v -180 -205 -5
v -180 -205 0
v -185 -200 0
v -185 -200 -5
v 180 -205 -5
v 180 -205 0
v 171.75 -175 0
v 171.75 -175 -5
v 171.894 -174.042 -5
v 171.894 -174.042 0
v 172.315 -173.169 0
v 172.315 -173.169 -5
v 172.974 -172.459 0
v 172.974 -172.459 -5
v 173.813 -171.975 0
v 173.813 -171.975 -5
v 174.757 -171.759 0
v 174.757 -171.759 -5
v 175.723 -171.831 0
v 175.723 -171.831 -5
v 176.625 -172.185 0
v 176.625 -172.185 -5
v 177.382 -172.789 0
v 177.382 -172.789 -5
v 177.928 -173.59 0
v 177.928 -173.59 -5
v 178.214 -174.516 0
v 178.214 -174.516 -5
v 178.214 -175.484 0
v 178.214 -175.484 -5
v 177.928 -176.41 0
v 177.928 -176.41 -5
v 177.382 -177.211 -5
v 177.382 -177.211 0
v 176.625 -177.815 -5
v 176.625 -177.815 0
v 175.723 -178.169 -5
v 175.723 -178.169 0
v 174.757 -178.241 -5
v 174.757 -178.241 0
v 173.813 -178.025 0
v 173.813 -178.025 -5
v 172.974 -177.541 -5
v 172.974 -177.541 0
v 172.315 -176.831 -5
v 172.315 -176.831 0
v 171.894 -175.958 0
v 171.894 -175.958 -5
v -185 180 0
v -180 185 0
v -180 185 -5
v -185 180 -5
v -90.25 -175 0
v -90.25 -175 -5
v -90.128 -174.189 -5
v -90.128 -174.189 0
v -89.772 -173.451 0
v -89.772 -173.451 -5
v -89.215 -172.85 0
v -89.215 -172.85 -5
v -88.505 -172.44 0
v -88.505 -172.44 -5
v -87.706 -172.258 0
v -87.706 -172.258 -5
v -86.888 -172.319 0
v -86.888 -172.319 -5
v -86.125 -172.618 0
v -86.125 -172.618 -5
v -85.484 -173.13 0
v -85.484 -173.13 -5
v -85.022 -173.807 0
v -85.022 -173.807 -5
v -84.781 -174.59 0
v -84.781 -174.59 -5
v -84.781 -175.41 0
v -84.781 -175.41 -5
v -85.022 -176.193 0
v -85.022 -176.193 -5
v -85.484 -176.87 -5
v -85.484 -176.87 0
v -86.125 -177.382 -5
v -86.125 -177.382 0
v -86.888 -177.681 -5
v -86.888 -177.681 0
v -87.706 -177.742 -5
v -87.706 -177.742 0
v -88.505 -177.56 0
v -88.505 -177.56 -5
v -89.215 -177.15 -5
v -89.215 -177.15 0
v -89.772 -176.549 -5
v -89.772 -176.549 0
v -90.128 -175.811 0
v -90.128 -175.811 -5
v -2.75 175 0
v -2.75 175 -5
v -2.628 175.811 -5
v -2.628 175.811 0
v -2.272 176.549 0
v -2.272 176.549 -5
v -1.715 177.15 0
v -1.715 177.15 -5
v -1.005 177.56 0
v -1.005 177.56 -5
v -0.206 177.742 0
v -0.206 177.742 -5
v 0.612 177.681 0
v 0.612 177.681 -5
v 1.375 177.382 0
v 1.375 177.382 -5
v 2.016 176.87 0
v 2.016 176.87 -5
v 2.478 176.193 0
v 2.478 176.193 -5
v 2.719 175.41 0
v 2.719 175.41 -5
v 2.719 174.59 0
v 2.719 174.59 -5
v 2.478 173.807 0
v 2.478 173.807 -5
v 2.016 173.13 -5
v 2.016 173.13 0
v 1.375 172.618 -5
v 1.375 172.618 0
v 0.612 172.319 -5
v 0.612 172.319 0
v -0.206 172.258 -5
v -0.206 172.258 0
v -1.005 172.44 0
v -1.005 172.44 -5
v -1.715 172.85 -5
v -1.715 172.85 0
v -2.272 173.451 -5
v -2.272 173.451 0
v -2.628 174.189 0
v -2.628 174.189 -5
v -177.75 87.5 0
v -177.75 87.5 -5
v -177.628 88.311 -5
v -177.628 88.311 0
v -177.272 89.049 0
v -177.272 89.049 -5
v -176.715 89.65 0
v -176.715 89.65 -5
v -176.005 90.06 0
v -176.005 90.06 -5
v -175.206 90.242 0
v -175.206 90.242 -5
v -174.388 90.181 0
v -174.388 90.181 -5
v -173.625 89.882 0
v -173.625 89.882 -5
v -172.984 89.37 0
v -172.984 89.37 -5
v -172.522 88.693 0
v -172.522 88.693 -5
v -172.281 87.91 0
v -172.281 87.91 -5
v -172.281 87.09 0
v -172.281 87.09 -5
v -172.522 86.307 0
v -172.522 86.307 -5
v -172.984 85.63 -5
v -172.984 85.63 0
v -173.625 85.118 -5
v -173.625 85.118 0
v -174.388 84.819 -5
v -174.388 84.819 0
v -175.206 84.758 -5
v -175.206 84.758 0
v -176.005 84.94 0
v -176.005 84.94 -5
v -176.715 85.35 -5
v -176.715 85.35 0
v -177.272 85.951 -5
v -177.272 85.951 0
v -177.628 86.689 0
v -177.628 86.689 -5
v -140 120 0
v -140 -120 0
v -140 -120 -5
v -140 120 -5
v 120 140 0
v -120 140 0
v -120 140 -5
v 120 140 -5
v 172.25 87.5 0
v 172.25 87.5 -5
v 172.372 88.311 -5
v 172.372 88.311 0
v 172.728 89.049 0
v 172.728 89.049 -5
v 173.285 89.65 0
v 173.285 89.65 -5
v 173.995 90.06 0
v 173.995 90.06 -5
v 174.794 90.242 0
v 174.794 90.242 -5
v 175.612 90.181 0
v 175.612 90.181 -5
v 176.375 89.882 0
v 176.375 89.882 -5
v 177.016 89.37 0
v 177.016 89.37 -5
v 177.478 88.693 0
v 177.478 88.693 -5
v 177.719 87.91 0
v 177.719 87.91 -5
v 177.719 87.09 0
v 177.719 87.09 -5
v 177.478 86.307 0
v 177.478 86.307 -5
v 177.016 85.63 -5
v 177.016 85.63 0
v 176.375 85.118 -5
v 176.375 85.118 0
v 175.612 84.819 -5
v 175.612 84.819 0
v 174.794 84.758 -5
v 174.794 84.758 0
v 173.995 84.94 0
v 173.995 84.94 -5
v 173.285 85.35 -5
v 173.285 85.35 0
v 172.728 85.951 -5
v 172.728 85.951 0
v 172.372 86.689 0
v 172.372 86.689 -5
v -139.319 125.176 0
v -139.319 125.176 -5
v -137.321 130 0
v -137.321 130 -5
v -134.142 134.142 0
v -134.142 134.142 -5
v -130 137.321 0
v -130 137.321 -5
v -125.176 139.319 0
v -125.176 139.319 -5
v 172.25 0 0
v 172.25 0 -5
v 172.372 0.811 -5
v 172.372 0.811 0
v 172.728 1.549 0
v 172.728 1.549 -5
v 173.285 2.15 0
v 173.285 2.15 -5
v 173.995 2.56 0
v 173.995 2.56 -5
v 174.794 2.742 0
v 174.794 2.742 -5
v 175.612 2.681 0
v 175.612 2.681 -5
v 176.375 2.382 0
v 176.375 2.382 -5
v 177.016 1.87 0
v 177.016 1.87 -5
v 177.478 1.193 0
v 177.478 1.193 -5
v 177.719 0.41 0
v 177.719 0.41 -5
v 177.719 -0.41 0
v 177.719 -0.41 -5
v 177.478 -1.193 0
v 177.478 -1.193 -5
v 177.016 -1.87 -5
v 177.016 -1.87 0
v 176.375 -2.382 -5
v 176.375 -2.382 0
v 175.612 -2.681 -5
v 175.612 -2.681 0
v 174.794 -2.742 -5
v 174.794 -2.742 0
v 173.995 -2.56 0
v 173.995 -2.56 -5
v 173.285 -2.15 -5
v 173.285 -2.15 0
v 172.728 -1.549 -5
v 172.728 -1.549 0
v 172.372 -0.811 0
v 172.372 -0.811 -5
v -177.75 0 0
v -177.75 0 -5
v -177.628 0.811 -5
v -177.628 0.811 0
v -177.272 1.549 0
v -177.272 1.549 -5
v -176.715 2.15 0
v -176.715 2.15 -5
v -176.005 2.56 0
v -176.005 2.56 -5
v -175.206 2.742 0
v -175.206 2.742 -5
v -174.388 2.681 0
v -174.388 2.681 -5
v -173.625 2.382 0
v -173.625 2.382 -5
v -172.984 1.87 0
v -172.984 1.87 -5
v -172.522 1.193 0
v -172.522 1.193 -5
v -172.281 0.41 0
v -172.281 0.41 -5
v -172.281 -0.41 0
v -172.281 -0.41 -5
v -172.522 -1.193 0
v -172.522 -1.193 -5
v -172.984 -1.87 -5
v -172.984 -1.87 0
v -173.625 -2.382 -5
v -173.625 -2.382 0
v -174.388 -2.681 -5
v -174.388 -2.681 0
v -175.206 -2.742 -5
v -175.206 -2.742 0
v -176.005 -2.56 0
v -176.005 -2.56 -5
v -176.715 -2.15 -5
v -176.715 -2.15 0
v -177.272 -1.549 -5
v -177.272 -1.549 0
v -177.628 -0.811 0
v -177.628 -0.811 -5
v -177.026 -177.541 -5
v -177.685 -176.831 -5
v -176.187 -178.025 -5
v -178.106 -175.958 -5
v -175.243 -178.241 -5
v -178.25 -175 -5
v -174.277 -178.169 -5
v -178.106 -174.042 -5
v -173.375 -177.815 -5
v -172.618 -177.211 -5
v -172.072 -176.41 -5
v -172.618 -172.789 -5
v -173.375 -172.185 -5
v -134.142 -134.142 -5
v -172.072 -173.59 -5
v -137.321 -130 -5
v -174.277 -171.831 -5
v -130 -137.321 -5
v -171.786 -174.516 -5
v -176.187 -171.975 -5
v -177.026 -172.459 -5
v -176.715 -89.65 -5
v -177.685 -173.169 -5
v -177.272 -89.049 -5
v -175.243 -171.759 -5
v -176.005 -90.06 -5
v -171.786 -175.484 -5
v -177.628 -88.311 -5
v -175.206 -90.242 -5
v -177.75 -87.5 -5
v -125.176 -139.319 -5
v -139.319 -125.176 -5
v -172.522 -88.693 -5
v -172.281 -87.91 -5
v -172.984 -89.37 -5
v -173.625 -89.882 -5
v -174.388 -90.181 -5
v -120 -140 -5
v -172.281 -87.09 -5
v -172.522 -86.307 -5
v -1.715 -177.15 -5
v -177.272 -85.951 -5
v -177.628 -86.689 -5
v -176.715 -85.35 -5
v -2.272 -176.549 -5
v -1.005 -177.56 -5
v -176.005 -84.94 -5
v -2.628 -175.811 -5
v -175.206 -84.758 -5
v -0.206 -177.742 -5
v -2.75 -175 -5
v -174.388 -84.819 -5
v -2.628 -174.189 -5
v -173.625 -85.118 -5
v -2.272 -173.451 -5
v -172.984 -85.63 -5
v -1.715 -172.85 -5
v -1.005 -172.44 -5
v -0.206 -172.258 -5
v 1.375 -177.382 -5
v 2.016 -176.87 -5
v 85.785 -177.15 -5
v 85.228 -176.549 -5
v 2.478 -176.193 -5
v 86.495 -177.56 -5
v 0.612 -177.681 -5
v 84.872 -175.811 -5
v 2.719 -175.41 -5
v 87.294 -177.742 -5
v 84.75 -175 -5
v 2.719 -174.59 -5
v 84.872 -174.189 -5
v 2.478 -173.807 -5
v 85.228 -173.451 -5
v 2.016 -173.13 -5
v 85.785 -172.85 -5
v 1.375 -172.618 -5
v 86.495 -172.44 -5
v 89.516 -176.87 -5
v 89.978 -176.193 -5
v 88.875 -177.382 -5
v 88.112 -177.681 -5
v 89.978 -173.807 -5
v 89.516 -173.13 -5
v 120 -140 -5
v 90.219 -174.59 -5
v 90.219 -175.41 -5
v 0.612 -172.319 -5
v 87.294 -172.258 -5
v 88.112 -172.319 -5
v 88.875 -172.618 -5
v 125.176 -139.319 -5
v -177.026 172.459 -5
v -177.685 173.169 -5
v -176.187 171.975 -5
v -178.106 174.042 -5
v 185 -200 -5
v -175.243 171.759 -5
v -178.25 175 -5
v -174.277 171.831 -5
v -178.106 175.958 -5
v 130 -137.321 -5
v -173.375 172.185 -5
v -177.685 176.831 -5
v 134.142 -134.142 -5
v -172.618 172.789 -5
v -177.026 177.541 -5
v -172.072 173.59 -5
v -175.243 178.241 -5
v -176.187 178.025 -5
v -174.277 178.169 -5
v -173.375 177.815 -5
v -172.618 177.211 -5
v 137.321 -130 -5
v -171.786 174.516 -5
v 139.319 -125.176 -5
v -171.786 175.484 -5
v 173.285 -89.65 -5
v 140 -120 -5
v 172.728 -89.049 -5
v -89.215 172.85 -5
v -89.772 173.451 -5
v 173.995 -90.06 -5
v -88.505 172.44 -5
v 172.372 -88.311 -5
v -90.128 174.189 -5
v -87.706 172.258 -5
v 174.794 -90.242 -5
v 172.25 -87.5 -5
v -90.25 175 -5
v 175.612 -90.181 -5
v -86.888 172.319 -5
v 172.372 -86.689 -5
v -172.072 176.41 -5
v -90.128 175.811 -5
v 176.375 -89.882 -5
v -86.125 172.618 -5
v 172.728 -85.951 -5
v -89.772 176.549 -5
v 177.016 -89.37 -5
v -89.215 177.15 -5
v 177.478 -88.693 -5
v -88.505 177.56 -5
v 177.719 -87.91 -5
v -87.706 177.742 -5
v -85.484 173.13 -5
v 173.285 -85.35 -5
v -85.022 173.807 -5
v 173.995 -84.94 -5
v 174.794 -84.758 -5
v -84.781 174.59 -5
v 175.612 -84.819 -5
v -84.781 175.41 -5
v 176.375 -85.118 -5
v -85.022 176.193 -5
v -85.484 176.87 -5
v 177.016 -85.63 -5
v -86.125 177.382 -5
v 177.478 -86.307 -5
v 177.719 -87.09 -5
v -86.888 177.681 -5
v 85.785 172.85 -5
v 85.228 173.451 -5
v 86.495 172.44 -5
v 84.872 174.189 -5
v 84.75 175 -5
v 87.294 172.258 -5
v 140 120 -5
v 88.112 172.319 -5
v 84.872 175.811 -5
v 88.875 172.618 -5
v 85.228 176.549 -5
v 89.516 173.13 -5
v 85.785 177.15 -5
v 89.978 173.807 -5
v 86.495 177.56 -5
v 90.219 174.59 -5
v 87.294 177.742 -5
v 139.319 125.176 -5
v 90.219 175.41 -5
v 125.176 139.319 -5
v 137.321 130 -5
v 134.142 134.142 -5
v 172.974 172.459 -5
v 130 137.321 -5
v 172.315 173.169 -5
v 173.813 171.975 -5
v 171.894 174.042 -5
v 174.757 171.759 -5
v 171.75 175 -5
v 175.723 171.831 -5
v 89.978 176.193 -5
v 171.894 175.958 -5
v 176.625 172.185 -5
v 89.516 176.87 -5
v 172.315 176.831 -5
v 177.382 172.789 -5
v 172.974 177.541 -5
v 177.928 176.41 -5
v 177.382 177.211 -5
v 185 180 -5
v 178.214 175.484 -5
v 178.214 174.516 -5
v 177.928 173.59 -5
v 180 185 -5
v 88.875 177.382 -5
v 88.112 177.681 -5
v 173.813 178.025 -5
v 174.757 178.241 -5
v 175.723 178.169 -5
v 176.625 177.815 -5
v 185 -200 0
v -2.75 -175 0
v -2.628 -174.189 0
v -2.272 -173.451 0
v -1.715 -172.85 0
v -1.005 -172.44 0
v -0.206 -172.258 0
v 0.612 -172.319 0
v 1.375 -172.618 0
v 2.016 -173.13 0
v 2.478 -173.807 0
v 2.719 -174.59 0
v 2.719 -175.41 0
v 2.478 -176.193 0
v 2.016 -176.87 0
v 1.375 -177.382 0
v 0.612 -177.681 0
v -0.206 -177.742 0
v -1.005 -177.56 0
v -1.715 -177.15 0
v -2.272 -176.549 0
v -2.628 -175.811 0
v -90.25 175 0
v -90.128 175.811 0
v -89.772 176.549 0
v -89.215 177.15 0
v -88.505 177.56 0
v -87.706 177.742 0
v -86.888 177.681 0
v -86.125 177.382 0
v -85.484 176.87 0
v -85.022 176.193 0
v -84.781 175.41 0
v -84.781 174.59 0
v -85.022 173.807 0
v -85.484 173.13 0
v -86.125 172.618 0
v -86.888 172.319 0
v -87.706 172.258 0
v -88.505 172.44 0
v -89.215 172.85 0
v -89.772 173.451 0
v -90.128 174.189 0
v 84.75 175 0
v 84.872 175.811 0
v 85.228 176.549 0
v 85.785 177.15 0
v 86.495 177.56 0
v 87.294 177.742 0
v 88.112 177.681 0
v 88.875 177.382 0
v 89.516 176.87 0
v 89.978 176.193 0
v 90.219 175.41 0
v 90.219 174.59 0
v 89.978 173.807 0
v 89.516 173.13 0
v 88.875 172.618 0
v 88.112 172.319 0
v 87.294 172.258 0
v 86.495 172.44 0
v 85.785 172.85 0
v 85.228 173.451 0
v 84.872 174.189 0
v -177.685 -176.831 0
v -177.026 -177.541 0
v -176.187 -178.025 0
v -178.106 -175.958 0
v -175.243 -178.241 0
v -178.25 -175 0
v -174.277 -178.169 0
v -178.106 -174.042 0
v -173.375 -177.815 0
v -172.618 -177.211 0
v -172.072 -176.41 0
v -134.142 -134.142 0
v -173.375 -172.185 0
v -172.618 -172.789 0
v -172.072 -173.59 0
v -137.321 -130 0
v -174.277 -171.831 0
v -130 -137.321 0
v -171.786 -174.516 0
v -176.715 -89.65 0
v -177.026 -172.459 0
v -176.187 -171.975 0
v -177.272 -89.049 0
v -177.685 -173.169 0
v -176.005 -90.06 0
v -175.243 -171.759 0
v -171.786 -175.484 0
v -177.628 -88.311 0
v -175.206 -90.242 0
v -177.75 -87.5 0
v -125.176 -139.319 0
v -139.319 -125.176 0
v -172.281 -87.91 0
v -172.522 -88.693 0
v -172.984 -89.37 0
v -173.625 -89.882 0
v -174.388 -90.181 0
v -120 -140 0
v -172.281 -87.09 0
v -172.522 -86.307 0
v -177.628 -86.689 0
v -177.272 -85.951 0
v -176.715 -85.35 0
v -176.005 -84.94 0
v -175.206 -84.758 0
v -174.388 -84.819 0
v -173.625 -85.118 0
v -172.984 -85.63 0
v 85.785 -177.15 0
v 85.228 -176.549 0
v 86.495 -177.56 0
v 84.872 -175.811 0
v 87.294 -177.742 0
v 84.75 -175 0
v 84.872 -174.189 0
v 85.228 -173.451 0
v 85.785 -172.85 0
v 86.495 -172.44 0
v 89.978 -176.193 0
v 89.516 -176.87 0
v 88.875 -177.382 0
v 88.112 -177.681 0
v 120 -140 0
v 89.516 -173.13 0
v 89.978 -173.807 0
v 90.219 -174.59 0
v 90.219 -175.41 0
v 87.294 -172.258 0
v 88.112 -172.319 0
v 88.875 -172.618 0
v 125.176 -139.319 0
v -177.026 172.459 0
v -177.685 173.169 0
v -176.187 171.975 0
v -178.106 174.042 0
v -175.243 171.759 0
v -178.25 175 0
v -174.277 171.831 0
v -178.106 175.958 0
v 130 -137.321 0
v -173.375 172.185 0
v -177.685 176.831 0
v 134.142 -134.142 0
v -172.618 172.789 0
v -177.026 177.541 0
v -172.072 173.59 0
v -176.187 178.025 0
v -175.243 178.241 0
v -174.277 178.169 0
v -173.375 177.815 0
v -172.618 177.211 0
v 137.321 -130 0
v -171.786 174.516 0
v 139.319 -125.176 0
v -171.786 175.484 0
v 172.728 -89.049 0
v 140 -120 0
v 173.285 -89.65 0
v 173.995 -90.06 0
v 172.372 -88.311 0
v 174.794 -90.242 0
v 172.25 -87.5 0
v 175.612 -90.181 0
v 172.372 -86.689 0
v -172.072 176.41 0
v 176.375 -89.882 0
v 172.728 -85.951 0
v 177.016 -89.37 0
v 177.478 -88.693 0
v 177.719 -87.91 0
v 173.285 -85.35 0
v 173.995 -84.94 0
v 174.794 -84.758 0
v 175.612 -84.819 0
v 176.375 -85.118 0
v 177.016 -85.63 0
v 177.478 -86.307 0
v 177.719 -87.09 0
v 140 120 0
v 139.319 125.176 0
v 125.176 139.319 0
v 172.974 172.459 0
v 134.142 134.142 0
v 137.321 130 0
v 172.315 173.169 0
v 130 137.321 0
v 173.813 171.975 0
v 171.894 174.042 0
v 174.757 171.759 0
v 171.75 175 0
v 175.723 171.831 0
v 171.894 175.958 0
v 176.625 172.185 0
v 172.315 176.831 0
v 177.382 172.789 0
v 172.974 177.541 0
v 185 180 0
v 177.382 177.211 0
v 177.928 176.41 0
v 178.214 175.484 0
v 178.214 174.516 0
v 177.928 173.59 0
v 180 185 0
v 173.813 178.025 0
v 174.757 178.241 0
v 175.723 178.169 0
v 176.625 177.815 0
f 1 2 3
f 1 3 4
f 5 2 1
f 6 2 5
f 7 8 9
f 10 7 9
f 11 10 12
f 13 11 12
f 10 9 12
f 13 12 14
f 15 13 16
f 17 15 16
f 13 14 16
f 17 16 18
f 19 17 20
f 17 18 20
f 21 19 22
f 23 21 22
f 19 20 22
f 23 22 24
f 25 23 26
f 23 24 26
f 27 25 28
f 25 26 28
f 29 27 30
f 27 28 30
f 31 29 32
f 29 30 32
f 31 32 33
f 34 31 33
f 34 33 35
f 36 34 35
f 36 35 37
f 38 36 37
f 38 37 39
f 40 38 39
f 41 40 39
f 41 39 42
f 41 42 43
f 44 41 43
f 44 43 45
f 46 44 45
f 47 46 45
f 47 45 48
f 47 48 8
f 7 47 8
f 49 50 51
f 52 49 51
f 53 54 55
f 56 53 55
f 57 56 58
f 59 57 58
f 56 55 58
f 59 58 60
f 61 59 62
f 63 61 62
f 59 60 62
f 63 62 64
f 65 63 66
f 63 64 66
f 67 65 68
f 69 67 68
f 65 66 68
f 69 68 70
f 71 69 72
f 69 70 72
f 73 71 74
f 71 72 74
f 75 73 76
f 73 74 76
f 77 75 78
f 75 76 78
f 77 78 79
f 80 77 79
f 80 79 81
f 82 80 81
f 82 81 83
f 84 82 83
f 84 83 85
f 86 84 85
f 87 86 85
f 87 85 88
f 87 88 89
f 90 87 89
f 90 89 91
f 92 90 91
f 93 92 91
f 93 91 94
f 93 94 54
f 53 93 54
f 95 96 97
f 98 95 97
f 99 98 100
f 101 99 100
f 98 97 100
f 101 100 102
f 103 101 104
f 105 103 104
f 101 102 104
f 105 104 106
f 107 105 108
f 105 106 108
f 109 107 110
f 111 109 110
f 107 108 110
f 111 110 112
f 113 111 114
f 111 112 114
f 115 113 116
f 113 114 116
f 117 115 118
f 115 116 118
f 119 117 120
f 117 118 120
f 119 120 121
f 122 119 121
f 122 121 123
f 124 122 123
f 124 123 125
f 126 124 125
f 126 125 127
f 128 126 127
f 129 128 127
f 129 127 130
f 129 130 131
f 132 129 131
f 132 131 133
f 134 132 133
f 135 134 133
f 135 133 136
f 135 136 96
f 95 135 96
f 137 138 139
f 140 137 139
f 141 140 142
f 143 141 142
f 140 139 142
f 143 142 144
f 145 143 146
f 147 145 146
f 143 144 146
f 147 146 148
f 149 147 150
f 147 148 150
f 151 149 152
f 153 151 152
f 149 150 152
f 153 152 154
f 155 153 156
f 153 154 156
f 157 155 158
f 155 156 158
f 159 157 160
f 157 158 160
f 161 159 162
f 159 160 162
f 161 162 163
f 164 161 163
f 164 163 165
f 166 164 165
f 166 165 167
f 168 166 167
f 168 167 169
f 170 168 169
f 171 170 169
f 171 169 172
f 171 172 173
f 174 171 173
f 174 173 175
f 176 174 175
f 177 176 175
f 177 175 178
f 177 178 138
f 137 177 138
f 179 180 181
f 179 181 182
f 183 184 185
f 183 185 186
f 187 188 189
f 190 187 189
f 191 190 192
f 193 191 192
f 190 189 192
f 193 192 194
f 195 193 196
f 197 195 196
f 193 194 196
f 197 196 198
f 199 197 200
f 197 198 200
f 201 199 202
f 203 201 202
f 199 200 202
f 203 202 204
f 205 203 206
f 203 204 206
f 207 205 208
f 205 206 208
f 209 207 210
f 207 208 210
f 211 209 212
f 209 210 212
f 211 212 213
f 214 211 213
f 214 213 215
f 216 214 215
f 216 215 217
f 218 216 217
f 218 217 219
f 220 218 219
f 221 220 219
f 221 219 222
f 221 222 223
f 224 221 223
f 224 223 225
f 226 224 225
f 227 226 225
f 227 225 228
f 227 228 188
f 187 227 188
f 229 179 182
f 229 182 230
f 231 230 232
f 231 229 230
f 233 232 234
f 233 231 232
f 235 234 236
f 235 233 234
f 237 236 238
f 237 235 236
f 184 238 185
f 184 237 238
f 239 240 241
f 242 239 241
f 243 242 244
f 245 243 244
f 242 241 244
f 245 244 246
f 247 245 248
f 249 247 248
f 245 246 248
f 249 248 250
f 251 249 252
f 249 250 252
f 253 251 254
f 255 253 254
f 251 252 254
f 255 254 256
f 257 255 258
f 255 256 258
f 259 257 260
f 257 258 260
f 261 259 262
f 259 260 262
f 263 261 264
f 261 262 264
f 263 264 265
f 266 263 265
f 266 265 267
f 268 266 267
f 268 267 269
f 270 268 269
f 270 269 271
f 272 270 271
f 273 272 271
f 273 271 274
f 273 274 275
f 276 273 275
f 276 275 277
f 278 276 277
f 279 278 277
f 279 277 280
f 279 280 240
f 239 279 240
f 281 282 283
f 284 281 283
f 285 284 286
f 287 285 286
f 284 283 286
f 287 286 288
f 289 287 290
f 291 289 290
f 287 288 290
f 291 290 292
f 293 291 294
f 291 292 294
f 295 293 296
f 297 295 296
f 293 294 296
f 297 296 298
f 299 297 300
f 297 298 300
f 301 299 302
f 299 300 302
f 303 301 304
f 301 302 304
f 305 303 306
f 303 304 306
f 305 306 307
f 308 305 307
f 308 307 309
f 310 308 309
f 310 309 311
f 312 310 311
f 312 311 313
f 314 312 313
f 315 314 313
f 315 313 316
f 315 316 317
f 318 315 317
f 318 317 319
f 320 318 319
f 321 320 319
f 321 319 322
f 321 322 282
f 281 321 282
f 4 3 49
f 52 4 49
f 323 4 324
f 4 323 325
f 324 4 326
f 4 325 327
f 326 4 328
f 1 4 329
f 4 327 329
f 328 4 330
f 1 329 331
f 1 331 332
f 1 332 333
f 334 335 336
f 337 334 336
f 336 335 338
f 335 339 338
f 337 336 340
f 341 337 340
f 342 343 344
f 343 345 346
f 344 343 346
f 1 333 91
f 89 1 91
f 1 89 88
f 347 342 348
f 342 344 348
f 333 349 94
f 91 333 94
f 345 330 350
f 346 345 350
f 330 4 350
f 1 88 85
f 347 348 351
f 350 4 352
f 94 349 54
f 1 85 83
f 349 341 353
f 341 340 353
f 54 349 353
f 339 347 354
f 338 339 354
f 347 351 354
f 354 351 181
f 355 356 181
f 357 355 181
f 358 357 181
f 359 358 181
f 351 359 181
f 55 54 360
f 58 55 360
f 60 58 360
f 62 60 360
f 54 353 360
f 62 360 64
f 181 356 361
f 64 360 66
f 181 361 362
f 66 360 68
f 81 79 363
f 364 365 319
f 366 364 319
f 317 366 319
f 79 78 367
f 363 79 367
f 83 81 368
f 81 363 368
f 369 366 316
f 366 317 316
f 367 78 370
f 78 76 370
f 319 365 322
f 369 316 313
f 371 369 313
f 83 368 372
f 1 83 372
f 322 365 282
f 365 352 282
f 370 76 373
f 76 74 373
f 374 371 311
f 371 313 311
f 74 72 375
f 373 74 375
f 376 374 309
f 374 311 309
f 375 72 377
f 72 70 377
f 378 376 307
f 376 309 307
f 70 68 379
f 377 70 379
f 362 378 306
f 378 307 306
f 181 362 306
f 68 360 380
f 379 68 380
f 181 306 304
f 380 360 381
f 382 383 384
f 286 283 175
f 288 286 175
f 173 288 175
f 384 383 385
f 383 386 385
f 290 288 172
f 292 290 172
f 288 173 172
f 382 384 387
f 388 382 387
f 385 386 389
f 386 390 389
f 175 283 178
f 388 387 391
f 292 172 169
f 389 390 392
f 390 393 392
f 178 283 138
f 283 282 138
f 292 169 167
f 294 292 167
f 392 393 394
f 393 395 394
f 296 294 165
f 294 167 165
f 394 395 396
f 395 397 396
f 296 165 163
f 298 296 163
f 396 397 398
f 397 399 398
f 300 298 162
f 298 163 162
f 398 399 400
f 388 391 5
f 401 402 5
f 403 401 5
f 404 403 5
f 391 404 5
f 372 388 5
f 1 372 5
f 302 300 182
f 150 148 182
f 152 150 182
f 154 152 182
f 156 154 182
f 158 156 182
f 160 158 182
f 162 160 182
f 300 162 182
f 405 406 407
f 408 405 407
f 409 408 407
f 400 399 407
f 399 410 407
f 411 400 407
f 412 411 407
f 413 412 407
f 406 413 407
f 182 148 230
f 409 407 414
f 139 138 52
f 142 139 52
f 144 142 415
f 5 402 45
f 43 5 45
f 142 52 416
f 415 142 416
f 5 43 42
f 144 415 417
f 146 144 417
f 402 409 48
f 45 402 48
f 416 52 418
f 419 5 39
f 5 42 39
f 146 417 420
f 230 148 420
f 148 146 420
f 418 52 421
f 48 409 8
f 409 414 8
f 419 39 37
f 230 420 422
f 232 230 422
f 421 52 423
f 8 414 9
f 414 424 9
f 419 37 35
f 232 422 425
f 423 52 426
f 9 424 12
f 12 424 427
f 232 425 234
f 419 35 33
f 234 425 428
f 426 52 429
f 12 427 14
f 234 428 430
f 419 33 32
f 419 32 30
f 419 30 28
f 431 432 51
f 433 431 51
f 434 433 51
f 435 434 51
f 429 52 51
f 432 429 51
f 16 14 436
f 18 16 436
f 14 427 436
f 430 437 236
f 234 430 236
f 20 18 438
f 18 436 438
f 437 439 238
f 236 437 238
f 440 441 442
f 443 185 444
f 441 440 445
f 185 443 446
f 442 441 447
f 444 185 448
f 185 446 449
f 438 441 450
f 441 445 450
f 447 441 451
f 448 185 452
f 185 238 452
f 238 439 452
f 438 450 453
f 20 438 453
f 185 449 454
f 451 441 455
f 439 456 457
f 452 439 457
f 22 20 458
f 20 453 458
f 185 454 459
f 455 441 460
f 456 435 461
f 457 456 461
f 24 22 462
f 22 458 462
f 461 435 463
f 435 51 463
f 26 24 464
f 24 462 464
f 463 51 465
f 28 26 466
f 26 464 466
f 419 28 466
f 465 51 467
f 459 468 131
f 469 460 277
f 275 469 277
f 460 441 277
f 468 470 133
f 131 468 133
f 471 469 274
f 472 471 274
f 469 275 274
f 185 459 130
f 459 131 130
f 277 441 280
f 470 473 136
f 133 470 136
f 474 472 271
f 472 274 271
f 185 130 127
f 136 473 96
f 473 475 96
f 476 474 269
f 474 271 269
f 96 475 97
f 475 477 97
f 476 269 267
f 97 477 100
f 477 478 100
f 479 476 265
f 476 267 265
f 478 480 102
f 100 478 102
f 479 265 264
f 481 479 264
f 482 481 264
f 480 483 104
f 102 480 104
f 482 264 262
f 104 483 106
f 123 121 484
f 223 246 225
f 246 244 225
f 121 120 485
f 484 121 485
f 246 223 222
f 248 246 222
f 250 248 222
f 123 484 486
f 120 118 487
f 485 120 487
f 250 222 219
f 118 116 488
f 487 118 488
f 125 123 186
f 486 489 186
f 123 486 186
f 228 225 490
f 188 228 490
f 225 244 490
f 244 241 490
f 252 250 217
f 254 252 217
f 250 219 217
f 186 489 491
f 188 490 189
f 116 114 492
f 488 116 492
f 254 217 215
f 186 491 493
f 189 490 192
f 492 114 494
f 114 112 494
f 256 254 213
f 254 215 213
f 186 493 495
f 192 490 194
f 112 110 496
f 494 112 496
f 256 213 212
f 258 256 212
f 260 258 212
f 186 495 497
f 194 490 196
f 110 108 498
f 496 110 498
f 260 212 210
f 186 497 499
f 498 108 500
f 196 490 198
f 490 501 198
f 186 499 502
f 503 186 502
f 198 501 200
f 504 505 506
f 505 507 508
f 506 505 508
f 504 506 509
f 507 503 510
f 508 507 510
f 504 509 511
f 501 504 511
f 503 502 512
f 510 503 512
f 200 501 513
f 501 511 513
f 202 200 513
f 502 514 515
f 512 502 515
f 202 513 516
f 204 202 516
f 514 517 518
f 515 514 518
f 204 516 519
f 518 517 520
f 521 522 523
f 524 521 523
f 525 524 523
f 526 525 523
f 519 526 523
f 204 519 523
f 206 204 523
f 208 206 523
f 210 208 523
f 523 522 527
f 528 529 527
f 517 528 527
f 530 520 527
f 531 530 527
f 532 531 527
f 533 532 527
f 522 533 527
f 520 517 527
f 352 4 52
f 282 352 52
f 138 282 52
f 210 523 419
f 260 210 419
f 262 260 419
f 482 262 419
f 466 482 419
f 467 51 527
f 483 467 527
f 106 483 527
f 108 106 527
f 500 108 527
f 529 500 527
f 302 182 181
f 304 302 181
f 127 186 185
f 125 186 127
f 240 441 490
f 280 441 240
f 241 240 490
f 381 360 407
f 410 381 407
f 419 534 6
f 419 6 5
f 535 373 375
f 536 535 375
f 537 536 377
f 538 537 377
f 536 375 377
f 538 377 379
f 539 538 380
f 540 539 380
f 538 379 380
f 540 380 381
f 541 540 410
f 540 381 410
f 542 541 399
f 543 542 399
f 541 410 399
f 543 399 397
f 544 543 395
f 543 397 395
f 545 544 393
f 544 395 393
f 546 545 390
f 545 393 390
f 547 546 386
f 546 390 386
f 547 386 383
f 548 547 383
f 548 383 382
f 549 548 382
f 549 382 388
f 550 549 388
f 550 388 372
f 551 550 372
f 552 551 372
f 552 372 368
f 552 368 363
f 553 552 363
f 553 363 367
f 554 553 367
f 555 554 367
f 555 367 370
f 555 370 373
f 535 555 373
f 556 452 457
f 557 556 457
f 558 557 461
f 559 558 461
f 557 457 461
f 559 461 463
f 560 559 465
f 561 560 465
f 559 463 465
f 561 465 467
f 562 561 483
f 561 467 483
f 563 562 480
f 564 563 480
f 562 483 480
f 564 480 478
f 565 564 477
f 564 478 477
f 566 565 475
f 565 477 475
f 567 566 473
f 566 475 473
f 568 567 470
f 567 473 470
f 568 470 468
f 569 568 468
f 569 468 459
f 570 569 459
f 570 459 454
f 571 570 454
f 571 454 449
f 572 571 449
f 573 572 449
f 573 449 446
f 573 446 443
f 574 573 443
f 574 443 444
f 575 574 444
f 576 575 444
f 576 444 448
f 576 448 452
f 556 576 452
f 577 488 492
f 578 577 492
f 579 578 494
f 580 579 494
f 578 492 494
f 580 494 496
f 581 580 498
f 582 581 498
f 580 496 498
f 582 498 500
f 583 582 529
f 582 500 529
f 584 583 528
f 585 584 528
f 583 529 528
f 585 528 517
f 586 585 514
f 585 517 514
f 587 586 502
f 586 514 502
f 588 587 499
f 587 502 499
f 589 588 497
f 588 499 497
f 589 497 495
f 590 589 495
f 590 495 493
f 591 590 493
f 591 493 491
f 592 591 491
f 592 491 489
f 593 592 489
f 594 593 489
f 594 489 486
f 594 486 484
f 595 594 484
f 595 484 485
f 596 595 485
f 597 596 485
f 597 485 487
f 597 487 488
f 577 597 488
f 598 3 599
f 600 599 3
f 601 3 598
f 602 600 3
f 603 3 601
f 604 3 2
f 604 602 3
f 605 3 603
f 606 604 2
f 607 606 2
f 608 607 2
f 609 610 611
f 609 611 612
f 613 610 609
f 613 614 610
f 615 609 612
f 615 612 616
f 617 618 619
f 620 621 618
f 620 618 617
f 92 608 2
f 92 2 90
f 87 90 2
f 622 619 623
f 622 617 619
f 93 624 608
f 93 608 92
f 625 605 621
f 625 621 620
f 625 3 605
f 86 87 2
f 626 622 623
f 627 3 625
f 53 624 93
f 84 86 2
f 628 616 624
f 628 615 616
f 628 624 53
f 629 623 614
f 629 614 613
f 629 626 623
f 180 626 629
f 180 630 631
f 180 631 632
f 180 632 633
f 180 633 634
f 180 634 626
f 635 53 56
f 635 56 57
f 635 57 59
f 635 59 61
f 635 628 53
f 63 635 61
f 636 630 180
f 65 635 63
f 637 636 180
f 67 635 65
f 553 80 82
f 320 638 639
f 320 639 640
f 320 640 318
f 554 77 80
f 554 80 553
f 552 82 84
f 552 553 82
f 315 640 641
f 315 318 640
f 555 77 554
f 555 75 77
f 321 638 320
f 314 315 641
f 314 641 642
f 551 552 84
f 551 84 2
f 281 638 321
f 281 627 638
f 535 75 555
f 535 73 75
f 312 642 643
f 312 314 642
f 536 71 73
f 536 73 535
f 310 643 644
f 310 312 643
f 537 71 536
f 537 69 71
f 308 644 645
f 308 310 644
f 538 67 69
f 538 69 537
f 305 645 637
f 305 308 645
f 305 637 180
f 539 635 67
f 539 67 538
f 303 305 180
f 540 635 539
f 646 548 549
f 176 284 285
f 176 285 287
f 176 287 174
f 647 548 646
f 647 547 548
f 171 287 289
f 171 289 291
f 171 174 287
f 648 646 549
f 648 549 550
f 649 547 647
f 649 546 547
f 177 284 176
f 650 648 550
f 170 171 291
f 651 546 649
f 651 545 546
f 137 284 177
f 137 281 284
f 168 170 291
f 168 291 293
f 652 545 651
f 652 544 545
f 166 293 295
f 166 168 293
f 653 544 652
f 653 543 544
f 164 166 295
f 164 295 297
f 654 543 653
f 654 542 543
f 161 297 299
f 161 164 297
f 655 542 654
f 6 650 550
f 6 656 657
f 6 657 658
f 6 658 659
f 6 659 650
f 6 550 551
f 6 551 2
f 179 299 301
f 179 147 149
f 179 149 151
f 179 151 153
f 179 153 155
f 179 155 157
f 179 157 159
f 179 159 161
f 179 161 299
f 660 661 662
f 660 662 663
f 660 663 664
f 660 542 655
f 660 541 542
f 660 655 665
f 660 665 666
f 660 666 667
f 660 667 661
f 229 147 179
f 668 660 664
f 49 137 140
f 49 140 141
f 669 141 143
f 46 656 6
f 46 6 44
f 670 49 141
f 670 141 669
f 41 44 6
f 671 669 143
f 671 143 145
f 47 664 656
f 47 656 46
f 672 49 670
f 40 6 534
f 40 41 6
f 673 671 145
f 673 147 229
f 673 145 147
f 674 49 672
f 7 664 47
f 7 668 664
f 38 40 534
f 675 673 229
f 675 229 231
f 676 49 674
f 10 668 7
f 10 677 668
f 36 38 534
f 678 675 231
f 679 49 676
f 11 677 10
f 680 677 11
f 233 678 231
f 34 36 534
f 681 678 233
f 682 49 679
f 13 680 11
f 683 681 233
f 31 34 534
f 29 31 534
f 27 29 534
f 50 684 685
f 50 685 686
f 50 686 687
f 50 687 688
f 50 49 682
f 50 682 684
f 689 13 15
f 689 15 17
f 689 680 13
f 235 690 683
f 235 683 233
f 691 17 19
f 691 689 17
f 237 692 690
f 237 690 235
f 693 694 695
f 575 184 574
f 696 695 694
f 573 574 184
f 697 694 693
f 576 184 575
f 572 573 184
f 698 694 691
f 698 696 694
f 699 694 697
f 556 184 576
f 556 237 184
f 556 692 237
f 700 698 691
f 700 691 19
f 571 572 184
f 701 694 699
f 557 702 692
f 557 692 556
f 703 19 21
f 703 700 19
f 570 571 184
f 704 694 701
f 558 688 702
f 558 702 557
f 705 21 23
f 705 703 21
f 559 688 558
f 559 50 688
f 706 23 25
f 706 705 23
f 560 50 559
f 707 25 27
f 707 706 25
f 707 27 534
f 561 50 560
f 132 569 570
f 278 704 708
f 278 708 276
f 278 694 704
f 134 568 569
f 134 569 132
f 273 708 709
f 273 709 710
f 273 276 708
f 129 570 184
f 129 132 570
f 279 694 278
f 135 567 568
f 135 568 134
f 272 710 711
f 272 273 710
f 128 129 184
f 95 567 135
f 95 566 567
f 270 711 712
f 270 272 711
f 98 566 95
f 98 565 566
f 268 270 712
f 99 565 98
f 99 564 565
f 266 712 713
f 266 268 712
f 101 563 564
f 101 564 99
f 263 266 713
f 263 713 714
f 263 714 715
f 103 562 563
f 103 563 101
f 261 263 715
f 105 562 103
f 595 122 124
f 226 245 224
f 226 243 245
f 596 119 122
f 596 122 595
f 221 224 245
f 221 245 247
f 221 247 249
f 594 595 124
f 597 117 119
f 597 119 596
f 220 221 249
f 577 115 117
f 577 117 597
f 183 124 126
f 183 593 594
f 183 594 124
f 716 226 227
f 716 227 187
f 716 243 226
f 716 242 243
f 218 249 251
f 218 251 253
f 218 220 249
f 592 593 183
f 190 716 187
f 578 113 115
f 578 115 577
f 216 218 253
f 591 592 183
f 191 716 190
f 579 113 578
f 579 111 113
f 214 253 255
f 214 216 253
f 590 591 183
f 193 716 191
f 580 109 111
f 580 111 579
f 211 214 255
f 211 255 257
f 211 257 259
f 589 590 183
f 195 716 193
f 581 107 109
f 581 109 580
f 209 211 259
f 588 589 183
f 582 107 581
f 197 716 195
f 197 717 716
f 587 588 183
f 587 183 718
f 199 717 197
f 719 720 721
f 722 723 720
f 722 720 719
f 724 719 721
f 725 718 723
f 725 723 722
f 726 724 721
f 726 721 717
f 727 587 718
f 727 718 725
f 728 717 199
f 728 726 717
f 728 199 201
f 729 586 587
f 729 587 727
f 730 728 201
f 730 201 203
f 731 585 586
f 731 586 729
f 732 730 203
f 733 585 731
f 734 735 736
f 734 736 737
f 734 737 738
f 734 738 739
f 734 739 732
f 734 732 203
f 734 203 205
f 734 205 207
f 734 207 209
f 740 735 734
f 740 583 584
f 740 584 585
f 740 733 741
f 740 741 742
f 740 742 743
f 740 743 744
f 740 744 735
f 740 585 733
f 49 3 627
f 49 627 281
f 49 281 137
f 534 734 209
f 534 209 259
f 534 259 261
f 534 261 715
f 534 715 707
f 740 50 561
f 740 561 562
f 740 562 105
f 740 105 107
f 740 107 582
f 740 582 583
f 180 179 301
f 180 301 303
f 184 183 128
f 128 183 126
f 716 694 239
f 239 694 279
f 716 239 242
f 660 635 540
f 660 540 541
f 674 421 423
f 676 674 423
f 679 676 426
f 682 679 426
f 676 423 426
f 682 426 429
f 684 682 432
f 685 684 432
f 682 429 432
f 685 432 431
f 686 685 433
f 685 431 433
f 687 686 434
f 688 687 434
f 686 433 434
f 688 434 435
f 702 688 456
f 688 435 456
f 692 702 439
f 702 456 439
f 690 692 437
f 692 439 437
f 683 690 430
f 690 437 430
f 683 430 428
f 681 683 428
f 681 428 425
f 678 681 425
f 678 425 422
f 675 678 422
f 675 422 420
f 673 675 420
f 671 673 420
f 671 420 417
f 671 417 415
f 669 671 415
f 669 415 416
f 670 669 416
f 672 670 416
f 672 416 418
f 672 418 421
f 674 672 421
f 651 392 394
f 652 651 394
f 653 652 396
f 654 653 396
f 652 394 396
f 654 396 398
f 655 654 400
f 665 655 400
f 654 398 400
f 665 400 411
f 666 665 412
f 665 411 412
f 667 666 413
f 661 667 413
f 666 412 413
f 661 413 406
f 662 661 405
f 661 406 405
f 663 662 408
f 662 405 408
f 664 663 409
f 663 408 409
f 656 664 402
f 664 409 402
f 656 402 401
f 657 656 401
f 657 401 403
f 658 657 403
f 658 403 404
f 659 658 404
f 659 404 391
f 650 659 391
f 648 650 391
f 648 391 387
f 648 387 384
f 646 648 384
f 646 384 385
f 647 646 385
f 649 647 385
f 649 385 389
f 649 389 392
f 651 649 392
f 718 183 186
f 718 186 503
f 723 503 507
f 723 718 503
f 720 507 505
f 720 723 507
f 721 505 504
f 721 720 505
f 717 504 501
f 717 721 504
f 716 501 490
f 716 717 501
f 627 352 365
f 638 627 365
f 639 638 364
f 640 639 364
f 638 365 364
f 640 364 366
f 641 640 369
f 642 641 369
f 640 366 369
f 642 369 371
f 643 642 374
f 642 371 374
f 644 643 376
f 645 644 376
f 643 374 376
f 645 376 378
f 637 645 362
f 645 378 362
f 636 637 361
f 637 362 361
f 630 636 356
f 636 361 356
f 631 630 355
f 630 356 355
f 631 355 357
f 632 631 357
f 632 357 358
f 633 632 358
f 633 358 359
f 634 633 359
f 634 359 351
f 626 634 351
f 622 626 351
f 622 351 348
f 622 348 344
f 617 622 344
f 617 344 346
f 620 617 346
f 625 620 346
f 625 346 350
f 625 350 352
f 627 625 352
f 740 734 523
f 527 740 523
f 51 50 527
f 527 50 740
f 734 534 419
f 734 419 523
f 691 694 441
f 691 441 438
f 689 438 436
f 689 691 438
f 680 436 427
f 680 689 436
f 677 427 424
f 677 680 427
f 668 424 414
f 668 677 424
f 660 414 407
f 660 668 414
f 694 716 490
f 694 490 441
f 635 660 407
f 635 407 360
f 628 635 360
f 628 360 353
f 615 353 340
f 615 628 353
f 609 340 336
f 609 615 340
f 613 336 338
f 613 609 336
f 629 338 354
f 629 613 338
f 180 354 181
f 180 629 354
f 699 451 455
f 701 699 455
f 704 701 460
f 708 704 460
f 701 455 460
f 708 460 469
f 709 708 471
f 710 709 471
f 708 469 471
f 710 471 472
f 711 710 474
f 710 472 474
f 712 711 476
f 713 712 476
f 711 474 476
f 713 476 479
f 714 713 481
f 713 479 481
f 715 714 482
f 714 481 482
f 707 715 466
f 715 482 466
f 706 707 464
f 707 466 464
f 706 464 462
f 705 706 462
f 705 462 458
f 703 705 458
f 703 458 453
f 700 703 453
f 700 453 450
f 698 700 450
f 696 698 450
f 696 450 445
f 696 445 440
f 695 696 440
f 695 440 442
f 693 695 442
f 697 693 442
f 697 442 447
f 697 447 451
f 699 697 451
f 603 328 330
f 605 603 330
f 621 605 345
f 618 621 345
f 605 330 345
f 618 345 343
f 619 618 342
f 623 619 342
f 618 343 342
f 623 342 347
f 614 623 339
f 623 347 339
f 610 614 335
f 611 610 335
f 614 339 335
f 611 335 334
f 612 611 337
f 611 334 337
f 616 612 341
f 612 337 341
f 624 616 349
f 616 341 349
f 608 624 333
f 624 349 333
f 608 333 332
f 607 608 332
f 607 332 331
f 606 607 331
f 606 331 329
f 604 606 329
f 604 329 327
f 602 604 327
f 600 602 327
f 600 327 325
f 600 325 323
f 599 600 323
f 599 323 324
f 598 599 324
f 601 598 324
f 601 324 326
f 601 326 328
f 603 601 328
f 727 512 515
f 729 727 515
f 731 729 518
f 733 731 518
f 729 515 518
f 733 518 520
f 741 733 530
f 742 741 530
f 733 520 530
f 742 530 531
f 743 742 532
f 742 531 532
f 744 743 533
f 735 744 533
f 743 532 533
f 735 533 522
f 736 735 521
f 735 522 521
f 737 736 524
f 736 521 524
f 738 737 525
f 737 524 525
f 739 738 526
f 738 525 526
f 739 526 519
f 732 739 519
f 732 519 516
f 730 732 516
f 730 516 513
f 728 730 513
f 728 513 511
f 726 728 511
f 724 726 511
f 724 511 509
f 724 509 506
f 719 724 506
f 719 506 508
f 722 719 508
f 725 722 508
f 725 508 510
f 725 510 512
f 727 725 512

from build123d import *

# Parameters (mm, degrees)
F0_W     = 370
F0_H     = 390
F1_DEPTH = 5
F2_D     = 5.5
F2_DEPTH = 17
F3_D     = 6.5
F3_DEPTH = 17
F4_SIZE  = 5


with BuildPart() as f1:
    # F0 (on Top) → F1 (new body)
    with BuildSketch(Plane.XY):
        with Locations((0, -10)):
            Rectangle(F0_W, F0_H)
        with BuildLine():
            ThreePointArc((-140, 120), (-134.142136, 134.142136), (-120, 140))
            Line((-120, 140), (120, 140))
            ThreePointArc((120, 140), (134.142136, 134.142136), (140, 120))
            Line((140, 120), (140, -120))
            ThreePointArc((140, -120), (134.142136, -134.142136), (120, -140))
            Line((120, -140), (-120, -140))
            ThreePointArc((-120, -140), (-134.142136, -134.142136), (-140, -120))
            Line((-140, -120), (-140, 120))
        make_face(mode=Mode.SUBTRACT)
    extrude(amount=-F1_DEPTH)

    # F2
    with Locations(Plane.XY):
        with Locations((-175, 87.5), (-175, 0), (-175, -87.5), (-87.5, -175), (0, -175), (87.5, -175), (175, -87.5), (175, 87.5), (87.5, 175), (0, 175), (-87.5, 175), (175, 0)):
            Hole(F2_D / 2, depth=F2_DEPTH)

    # F3
    with Locations(Plane.XY):
        with Locations((-175, -175), (-175, 175), (175, 175), (175, -175)):
            Hole(F3_D / 2, depth=F3_DEPTH)

    # F4
    f4_edges = [f1.edges().sort_by_distance(p)[0] for p in [
        (-185, -205, -2.5),
        (185, -205, -2.5),
        (185, 185, -2.5),
        (-185, 185, -2.5),
    ]]
    chamfer(f4_edges, length=F4_SIZE)


solid = f1.part
